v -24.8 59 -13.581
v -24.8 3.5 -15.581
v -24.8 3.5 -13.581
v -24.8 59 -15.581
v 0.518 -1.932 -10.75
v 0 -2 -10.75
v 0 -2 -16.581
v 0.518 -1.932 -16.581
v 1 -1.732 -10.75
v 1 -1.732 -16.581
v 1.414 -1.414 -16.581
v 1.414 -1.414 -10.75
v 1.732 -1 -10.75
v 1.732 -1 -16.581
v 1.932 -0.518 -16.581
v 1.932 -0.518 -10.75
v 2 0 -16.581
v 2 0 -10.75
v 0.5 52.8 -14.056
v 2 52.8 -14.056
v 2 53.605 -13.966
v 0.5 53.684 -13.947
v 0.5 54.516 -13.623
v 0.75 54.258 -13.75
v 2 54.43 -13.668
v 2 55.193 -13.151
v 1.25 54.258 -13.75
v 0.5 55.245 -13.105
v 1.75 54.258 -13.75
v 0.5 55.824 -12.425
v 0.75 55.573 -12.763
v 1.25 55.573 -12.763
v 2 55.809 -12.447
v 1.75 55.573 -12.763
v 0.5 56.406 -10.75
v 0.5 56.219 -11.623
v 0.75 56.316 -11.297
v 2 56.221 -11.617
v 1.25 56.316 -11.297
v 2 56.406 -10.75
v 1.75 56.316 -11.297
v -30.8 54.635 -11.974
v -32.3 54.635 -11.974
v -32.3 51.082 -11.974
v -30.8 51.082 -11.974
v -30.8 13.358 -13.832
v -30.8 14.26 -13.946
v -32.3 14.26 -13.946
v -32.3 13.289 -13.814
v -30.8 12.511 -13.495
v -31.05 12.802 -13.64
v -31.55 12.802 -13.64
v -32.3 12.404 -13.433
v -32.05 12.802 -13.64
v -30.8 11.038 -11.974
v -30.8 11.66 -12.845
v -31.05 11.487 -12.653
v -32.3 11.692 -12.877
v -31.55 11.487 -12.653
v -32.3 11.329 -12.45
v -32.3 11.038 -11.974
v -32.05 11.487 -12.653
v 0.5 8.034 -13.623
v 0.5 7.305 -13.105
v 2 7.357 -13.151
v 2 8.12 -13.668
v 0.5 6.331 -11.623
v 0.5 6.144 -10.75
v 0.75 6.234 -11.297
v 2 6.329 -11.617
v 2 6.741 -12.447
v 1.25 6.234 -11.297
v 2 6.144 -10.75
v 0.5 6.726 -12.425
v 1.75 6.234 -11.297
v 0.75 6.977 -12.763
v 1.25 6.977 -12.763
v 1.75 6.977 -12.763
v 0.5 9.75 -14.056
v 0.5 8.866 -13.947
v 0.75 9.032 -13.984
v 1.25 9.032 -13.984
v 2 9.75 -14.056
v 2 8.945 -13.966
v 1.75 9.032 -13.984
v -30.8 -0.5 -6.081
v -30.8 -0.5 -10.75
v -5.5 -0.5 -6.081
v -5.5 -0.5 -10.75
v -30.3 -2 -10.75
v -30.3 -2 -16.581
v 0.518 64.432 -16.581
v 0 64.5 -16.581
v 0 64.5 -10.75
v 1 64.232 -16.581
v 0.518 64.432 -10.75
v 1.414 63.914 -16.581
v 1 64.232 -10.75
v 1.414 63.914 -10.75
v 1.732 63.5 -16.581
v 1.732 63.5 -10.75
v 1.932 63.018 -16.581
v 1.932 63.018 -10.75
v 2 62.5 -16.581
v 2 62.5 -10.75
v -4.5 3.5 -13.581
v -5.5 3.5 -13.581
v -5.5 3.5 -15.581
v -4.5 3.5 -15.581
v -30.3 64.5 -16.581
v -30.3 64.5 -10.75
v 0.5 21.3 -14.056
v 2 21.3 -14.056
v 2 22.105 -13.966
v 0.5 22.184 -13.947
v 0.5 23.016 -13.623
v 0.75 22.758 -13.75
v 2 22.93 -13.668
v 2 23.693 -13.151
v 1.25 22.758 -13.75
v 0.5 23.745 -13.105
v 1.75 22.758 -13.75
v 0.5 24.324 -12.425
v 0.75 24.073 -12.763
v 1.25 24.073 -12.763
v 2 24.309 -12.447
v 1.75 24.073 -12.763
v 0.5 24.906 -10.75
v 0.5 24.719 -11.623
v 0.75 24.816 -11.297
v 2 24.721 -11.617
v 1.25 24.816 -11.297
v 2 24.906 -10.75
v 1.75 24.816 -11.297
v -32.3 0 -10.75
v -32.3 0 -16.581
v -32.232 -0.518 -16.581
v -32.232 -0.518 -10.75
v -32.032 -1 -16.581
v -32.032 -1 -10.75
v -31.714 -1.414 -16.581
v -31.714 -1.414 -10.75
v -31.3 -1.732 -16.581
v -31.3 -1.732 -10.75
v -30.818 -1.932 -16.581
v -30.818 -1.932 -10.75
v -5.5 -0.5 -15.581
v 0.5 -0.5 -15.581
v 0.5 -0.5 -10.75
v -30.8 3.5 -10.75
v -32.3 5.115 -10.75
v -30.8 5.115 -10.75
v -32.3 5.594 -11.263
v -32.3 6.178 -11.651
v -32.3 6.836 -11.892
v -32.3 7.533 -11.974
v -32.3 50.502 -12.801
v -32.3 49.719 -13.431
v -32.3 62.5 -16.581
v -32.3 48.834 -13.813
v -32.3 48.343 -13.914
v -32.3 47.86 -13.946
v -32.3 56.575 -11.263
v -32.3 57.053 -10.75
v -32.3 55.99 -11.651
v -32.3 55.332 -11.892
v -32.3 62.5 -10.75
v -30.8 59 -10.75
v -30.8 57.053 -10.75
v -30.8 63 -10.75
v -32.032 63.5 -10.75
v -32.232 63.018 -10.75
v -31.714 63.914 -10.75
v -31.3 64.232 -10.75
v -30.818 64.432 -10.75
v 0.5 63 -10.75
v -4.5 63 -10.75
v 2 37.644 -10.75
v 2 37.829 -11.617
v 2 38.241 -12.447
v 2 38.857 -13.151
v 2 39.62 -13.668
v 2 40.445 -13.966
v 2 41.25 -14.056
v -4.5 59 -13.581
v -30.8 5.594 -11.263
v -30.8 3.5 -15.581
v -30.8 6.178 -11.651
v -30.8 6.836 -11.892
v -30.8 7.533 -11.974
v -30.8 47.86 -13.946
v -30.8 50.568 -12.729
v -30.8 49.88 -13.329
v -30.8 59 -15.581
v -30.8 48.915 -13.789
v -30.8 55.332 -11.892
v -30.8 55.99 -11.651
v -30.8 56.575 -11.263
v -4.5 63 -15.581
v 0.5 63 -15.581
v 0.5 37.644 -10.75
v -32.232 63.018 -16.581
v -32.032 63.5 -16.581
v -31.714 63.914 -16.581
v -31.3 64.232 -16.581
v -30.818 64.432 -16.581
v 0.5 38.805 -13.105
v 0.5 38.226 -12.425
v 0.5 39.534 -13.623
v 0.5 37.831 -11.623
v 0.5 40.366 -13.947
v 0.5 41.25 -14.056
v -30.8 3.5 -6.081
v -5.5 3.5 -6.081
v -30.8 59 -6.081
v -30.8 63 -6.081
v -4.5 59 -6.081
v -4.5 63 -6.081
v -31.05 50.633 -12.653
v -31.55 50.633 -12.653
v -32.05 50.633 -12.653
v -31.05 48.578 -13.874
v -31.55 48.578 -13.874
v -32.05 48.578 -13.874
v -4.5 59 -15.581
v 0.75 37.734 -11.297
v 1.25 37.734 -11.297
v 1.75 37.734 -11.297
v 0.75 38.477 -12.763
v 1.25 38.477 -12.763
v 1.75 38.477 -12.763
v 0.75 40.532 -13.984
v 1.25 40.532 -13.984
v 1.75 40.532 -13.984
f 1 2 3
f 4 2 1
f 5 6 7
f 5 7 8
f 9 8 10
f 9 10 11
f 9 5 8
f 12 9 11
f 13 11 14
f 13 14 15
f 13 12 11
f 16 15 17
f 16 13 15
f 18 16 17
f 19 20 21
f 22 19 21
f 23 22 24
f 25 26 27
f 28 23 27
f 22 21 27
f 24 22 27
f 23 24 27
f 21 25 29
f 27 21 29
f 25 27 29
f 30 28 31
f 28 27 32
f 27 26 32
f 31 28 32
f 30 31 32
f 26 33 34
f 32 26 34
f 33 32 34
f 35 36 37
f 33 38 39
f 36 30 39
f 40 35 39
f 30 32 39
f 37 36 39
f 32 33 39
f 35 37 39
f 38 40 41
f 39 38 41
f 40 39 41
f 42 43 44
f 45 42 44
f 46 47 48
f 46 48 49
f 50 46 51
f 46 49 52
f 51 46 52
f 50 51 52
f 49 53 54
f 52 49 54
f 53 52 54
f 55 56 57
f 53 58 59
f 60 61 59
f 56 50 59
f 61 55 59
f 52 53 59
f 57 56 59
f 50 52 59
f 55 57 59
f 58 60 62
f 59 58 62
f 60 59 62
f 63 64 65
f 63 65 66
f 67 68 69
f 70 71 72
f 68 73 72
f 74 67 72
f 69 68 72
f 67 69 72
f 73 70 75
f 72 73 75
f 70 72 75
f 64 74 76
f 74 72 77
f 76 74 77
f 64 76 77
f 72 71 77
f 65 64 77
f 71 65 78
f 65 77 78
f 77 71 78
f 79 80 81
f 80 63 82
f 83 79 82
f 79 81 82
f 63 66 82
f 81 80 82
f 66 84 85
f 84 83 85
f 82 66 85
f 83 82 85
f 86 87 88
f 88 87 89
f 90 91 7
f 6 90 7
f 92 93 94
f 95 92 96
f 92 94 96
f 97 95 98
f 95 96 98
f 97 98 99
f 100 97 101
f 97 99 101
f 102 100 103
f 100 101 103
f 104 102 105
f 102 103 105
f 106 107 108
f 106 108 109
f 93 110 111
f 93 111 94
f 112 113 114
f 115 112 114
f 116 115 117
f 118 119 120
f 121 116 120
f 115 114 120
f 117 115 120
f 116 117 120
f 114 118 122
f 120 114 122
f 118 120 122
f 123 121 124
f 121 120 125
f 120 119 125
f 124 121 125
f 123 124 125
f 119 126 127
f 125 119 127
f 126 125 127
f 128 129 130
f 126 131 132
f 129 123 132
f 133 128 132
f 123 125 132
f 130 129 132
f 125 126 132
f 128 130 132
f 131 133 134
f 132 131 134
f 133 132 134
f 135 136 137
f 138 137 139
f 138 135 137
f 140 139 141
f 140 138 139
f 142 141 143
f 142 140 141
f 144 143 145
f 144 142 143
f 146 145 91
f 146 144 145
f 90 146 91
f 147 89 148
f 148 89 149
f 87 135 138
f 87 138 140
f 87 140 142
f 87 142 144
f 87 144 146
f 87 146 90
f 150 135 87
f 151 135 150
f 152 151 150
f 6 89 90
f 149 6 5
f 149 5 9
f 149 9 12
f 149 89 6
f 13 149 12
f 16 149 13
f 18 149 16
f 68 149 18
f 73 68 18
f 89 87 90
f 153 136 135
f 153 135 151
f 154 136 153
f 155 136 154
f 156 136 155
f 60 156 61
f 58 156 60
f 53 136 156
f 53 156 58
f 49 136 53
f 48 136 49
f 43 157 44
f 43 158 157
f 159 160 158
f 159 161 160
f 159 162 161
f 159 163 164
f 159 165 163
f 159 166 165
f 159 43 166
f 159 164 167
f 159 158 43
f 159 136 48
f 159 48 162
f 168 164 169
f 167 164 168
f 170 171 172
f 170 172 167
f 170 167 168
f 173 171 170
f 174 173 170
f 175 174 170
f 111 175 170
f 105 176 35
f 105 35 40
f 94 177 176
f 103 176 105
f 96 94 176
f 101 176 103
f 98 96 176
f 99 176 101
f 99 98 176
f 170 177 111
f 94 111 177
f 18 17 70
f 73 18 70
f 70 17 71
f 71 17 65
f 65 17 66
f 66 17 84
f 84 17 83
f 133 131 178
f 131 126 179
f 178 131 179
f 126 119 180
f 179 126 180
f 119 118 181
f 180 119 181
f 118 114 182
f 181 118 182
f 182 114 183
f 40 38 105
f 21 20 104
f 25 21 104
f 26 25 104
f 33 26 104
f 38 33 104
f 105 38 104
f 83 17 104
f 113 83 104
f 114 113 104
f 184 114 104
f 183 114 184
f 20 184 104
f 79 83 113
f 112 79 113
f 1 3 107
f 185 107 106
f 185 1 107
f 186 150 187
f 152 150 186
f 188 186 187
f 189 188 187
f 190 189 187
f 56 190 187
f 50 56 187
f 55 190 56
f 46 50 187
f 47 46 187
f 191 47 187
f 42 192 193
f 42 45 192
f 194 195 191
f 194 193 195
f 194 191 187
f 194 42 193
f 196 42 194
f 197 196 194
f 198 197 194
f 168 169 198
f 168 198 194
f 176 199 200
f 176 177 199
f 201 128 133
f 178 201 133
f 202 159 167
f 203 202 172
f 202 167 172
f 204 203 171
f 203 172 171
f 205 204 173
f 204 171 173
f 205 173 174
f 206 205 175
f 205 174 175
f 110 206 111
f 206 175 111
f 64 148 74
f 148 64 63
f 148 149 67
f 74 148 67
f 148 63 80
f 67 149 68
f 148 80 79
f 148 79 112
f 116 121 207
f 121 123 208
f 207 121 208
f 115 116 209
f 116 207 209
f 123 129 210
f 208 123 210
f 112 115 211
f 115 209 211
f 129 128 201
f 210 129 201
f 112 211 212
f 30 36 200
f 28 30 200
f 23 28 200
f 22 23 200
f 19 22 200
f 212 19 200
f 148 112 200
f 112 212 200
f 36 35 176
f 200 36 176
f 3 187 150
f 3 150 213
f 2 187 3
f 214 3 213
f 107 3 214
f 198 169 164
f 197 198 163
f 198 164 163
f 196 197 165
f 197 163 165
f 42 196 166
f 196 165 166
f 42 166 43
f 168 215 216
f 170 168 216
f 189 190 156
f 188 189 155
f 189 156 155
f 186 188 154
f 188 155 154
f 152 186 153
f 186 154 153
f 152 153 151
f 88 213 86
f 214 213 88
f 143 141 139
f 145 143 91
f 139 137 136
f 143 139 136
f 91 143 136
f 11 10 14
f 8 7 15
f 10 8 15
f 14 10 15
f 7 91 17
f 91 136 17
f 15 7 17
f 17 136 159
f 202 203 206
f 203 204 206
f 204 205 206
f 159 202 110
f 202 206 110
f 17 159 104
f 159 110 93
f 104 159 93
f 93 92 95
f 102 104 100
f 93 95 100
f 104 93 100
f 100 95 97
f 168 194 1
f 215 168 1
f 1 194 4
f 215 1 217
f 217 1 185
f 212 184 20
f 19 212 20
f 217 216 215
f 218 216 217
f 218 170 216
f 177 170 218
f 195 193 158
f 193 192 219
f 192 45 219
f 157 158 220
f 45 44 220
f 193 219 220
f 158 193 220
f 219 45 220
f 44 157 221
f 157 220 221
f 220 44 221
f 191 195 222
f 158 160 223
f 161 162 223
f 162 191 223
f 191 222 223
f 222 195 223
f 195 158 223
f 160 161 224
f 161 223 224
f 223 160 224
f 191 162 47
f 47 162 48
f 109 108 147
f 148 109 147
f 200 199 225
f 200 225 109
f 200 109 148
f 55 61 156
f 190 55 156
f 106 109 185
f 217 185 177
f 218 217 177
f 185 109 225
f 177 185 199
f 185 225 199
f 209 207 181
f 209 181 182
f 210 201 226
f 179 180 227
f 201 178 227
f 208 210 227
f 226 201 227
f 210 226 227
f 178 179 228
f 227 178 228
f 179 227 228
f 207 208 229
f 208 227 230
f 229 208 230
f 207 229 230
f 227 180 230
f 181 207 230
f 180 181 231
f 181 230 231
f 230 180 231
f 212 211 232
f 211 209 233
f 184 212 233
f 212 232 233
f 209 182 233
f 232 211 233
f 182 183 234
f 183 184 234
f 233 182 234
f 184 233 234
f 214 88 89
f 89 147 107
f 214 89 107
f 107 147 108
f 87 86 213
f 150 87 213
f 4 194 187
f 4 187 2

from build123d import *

# Parameters (mm, degrees)
BOSS_EXTRUDE3_DEPTH      = 3.249999
BOSS_EXTRUDE3_DEPTH_BACK = 16.581442
SKETCH1_W                = 34.3
SKETCH1_H                = 66.5
CUT_EXTRUDE1_DEPTH       = 5
CUT_EXTRUDE2_DEPTH       = 5
FILLET1_R                = 2
SKETCH5_W                = 51.30778099
SKETCH5_H                = 76.39990746
CUT_EXTRUDE3_DEPTH       = 14
SKETCH6_W                = 31.3
SKETCH6_H                = 63.5
CUT_EXTRUDE4_DEPTH       = 4.831437303
SKETCH7_W                = 26.3
SKETCH7_H                = 4
SKETCH7_W_2              = 25.3
BOSS_EXTRUDE4_DEPTH      = 9.5
SKETCH8_W                = 20.3
SKETCH8_H                = 55.5
BOSS_EXTRUDE5_DEPTH      = 2
CUT_EXTRUDE5_DEPTH       = 1.5


with BuildPart() as part:
    # Sketch1 → Boss-Extrude3 (new, two sides: drawn at the far end of the back side and taken through both)
    with BuildSketch(Plane.XY.offset(-BOSS_EXTRUDE3_DEPTH_BACK)):
        with Locations((-15.15, 31.25)):
            Rectangle(SKETCH1_W, SKETCH1_H)
    extrude(amount=BOSS_EXTRUDE3_DEPTH + BOSS_EXTRUDE3_DEPTH_BACK)

    # Sketch3 → Cut-Extrude1 (cut)
    with BuildSketch(Plane.ZY.offset(32.3)):
        with BuildLine():
            Line((-13.946442816, 47.860002379), (-13.946442816, 14.260002379))
            add(Edge.make_bspline(
                [(-13.946442816, 14.260002379), (-13.946442816, 14.019317473), (-13.90167089, 13.549905983), (-13.594210712, 12.544215416), (-12.741245974, 11.38215204), (-11.448721179, 10.74393594), (-10.404919412, 10.615783107), (-9.934864774, 10.653203818), (-9.697836412, 10.694998313)],
                knots=[0, 0, 0, 0, 0.125, 0.25, 0.5, 0.75, 0.875, 1, 1, 1, 1], degree=3))
            Line((-9.697836412, 10.694998313), (-6.707836413, 11.222215985))
            add(Edge.make_bspline(
                [(-6.707836413, 11.222215985), (-6.30796959, 11.292723295), (-5.54451734, 11.557407058), (-4.497780226, 12.405299319), (-3.844533346, 13.58336909), (-3.716442816, 14.381184638), (-3.716442816, 14.787220052)],
                knots=[0, 0, 0, 0, 0.25, 0.5, 0.75, 1, 1, 1, 1], degree=3))
            Line((-3.716442816, 14.787220052), (-3.716442816, 47.332784706))
            add(Edge.make_bspline(
                [(-3.716442816, 47.332784706), (-3.716442815, 47.73882012), (-3.844533346, 48.536635667), (-4.497780225, 49.714705439), (-5.544517339, 50.5625977), (-6.307969589, 50.827281463), (-6.707836412, 50.897788773)],
                knots=[0, 0, 0, 0, 0.25, 0.5, 0.75, 1, 1, 1, 1], degree=3))
            Line((-6.707836412, 50.897788773), (-9.697836412, 51.425006445))
            add(Edge.make_bspline(
                [(-9.697836412, 51.425006445), (-9.934864773, 51.46680094), (-10.404919411, 51.504221651), (-11.448721179, 51.376068818), (-12.741245974, 50.737852719), (-13.594210712, 49.575789343), (-13.90167089, 48.570098776), (-13.946442816, 48.100687285), (-13.946442816, 47.860002379)],
                knots=[0, 0, 0, 0, 0.125, 0.25, 0.5, 0.75, 0.875, 1, 1, 1, 1], degree=3))
        make_face()
    extrude(amount=-CUT_EXTRUDE1_DEPTH, mode=Mode.SUBTRACT)

    # Sketch4 → Cut-Extrude2 (cut)
    with BuildSketch(Plane(origin=(2, 0, 0), x_dir=(0, 0, -1), z_dir=(1, 0, 0))):
        with BuildLine():
            Line((6.817836087, 38.212213104), (9.807836086, 37.684995431))
            add(Edge.make_bspline(
                [(9.807836086, 37.684995431), (10.044864448, 37.643200936), (10.514919086, 37.605780225), (11.558720853, 37.733933058), (12.851245648, 38.372149158), (13.704210386, 39.534212534), (14.011670565, 40.539903101), (14.05644249, 41.009314591), (14.05644249, 41.249999497)],
                knots=[0, 0, 0, 0, 0.125, 0.25, 0.5, 0.75, 0.875, 1, 1, 1, 1], degree=3))
            Line((14.05644249, 41.249999497), (14.05644249, 52.799999497))
            add(Edge.make_bspline(
                [(14.05644249, 52.799999497), (14.05644249, 53.040684403), (14.011670565, 53.510095894), (13.704210386, 54.51578646), (12.851245648, 55.677849837), (11.558720853, 56.316065936), (10.514919086, 56.444218769), (10.044864448, 56.406798058), (9.807836087, 56.365003563)],
                knots=[0, 0, 0, 0, 0.125, 0.25, 0.5, 0.75, 0.875, 1, 1, 1, 1], degree=3))
            Line((9.807836087, 56.365003563), (6.817836087, 55.837785891))
            add(Edge.make_bspline(
                [(6.817836087, 55.837785891), (6.417969263, 55.767278581), (5.654517014, 55.502594818), (4.6077799, 54.654702557), (3.95453302, 53.476632786), (3.82644249, 52.678817239), (3.82644249, 52.272781825)],
                knots=[0, 0, 0, 0, 0.25, 0.5, 0.75, 1, 1, 1, 1], degree=3))
            Line((3.82644249, 52.272781825), (3.82644249, 41.77721717))
            add(Edge.make_bspline(
                [(3.82644249, 41.77721717), (3.82644249, 41.371181756), (3.95453302, 40.573366208), (4.6077799, 39.395296437), (5.654517014, 38.547404177), (6.417969263, 38.282720413), (6.817836087, 38.212213104)],
                knots=[0, 0, 0, 0, 0.25, 0.5, 0.75, 1, 1, 1, 1], degree=3))
        make_face()
        with BuildLine():
            Line((3.82644249, 20.772783732), (3.82644249, 10.277219077))
            add(Edge.make_bspline(
                [(3.82644249, 10.277219077), (3.82644249, 9.871183663), (3.95453302, 9.073368116), (4.6077799, 7.895298345), (5.654517014, 7.047406084), (6.417969263, 6.782722321), (6.817836087, 6.712215011)],
                knots=[0, 0, 0, 0, 0.25, 0.5, 0.75, 1, 1, 1, 1], degree=3))
            Line((6.817836087, 6.712215011), (9.807836086, 6.184997339))
            add(Edge.make_bspline(
                [(9.807836086, 6.184997339), (10.044864448, 6.143202843), (10.514919086, 6.105782132), (11.558720853, 6.233934965), (12.851245648, 6.872151065), (13.704210386, 8.034214441), (14.011670565, 9.039905008), (14.05644249, 9.509316499), (14.05644249, 9.750001404)],
                knots=[0, 0, 0, 0, 0.125, 0.25, 0.5, 0.75, 0.875, 1, 1, 1, 1], degree=3))
            Line((14.05644249, 9.750001404), (14.05644249, 21.300001404))
            add(Edge.make_bspline(
                [(14.05644249, 21.300001404), (14.05644249, 21.54068631), (14.011670565, 22.010097801), (13.704210386, 23.015788368), (12.851245648, 24.177851744), (11.558720853, 24.816067843), (10.514919086, 24.944220677), (10.044864448, 24.906799966), (9.807836087, 24.86500547)],
                knots=[0, 0, 0, 0, 0.125, 0.25, 0.5, 0.75, 0.875, 1, 1, 1, 1], degree=3))
            Line((9.807836087, 24.86500547), (6.817836087, 24.337787798))
            add(Edge.make_bspline(
                [(6.817836087, 24.337787798), (6.417969263, 24.267280488), (5.654517014, 24.002596725), (4.6077799, 23.154704464), (3.95453302, 21.976634693), (3.82644249, 21.178819146), (3.82644249, 20.772783732)],
                knots=[0, 0, 0, 0, 0.25, 0.5, 0.75, 1, 1, 1, 1], degree=3))
        make_face()
    extrude(amount=-CUT_EXTRUDE2_DEPTH, mode=Mode.SUBTRACT)

    # Fillet1
    fillet1_edges = [part.edges().sort_by_distance(p)[0] for p in [
        (-32.3, -2, -6.6657215),
        (2, -2, -6.6657215),
        (2, 64.5, -6.6657215),
        (-32.3, 64.5, -6.6657215),
    ]]
    fillet(fillet1_edges, radius=FILLET1_R)

    # Sketch5 → Cut-Extrude3 (cut)
    with BuildSketch(Plane(origin=(0, 2.84e-07, 3.250003097), x_dir=(1, 0, 0), z_dir=(0, 8.742273400000003e-08, 0.9999999999999963))):
        with Locations((-12.815688561, 29.564706803)):
            Rectangle(SKETCH5_W, SKETCH5_H)
    extrude(amount=-CUT_EXTRUDE3_DEPTH, mode=Mode.SUBTRACT)


with BuildPart() as cut_extrude3_kept_piece:
    # of the separate pieces the step leaves, the one the design keeps (cut_extrude3_pieces_kept)
    add(part.part.solids().sort_by_distance((-30.3, 64.5, -16.581442))[0])

    # Sketch6 → Cut-Extrude4 (cut)
    with BuildSketch(Plane(origin=(0, -9.4e-07, -10.749996903), x_dir=(1, 0, 0), z_dir=(0, 8.742273399652584e-08, 0.9999999999999963))):
        with Locations((-15.15, 31.25000094)):
            Rectangle(SKETCH6_W, SKETCH6_H)
    extrude(amount=-CUT_EXTRUDE4_DEPTH, mode=Mode.SUBTRACT)


with BuildPart() as boss_extrude4_tool:
    # Sketch7 → Boss-Extrude4 (new body)
    with BuildSketch(Plane(origin=(1.362e-06, 0, -15.581439757), x_dir=(0.9999999999999963, 0, 8.742273400000003e-08), z_dir=(-8.742273400000003e-08, 1.0000000000000005e-15, 0.9999999999999963))):
        with Locations((-17.650001362, 60.999999578)):
            Rectangle(SKETCH7_W, SKETCH7_H)
        with Locations((-18.150001362, 1.499999578)):
            Rectangle(SKETCH7_W_2, SKETCH7_H)
    extrude(amount=BOSS_EXTRUDE4_DEPTH)


with BuildPart() as cut_extrude3_kept_piece_1:
    add(cut_extrude3_kept_piece.part)


with BuildPart() as cut_extrude3_kept_piece_2:
    # Boss-Extrude4: joined with boss_extrude4_tool
    add(cut_extrude3_kept_piece_1.part.fuse(boss_extrude4_tool.part, tol=0.00001))

    # Sketch8 → Boss-Extrude5 (add)
    with BuildSketch(Plane(origin=(1.362e-06, 0, -15.581439757), x_dir=(0.9999999999999963, 0, 8.742273400000003e-08), z_dir=(-8.742273400000003e-08, 1.0000000000000005e-15, 0.9999999999999963))):
        with Locations((-14.650001362, 31.249999578)):
            Rectangle(SKETCH8_W, SKETCH8_H)
    extrude(amount=BOSS_EXTRUDE5_DEPTH)

    # Sketch9 → Cut-Extrude5 (cut)
    with BuildSketch(Plane.ZY.offset(32.3)):
        with BuildLine():
            Line((-11.974063023, 54.635108256), (-11.974063023, 7.533043045))
            ThreePointArc((-11.974063023, 7.533043045), (-8.974063023, 4.533043045), (-5.974063023, 7.533043045))
            Line((-5.974063023, 7.533043045), (-5.974063023, 54.635108256))
            ThreePointArc((-5.974063023, 54.635108256), (-8.974063023, 57.635108256), (-11.974063023, 54.635108256))
        make_face()
    extrude(amount=-CUT_EXTRUDE5_DEPTH, mode=Mode.SUBTRACT)


solid = cut_extrude3_kept_piece_2.part
